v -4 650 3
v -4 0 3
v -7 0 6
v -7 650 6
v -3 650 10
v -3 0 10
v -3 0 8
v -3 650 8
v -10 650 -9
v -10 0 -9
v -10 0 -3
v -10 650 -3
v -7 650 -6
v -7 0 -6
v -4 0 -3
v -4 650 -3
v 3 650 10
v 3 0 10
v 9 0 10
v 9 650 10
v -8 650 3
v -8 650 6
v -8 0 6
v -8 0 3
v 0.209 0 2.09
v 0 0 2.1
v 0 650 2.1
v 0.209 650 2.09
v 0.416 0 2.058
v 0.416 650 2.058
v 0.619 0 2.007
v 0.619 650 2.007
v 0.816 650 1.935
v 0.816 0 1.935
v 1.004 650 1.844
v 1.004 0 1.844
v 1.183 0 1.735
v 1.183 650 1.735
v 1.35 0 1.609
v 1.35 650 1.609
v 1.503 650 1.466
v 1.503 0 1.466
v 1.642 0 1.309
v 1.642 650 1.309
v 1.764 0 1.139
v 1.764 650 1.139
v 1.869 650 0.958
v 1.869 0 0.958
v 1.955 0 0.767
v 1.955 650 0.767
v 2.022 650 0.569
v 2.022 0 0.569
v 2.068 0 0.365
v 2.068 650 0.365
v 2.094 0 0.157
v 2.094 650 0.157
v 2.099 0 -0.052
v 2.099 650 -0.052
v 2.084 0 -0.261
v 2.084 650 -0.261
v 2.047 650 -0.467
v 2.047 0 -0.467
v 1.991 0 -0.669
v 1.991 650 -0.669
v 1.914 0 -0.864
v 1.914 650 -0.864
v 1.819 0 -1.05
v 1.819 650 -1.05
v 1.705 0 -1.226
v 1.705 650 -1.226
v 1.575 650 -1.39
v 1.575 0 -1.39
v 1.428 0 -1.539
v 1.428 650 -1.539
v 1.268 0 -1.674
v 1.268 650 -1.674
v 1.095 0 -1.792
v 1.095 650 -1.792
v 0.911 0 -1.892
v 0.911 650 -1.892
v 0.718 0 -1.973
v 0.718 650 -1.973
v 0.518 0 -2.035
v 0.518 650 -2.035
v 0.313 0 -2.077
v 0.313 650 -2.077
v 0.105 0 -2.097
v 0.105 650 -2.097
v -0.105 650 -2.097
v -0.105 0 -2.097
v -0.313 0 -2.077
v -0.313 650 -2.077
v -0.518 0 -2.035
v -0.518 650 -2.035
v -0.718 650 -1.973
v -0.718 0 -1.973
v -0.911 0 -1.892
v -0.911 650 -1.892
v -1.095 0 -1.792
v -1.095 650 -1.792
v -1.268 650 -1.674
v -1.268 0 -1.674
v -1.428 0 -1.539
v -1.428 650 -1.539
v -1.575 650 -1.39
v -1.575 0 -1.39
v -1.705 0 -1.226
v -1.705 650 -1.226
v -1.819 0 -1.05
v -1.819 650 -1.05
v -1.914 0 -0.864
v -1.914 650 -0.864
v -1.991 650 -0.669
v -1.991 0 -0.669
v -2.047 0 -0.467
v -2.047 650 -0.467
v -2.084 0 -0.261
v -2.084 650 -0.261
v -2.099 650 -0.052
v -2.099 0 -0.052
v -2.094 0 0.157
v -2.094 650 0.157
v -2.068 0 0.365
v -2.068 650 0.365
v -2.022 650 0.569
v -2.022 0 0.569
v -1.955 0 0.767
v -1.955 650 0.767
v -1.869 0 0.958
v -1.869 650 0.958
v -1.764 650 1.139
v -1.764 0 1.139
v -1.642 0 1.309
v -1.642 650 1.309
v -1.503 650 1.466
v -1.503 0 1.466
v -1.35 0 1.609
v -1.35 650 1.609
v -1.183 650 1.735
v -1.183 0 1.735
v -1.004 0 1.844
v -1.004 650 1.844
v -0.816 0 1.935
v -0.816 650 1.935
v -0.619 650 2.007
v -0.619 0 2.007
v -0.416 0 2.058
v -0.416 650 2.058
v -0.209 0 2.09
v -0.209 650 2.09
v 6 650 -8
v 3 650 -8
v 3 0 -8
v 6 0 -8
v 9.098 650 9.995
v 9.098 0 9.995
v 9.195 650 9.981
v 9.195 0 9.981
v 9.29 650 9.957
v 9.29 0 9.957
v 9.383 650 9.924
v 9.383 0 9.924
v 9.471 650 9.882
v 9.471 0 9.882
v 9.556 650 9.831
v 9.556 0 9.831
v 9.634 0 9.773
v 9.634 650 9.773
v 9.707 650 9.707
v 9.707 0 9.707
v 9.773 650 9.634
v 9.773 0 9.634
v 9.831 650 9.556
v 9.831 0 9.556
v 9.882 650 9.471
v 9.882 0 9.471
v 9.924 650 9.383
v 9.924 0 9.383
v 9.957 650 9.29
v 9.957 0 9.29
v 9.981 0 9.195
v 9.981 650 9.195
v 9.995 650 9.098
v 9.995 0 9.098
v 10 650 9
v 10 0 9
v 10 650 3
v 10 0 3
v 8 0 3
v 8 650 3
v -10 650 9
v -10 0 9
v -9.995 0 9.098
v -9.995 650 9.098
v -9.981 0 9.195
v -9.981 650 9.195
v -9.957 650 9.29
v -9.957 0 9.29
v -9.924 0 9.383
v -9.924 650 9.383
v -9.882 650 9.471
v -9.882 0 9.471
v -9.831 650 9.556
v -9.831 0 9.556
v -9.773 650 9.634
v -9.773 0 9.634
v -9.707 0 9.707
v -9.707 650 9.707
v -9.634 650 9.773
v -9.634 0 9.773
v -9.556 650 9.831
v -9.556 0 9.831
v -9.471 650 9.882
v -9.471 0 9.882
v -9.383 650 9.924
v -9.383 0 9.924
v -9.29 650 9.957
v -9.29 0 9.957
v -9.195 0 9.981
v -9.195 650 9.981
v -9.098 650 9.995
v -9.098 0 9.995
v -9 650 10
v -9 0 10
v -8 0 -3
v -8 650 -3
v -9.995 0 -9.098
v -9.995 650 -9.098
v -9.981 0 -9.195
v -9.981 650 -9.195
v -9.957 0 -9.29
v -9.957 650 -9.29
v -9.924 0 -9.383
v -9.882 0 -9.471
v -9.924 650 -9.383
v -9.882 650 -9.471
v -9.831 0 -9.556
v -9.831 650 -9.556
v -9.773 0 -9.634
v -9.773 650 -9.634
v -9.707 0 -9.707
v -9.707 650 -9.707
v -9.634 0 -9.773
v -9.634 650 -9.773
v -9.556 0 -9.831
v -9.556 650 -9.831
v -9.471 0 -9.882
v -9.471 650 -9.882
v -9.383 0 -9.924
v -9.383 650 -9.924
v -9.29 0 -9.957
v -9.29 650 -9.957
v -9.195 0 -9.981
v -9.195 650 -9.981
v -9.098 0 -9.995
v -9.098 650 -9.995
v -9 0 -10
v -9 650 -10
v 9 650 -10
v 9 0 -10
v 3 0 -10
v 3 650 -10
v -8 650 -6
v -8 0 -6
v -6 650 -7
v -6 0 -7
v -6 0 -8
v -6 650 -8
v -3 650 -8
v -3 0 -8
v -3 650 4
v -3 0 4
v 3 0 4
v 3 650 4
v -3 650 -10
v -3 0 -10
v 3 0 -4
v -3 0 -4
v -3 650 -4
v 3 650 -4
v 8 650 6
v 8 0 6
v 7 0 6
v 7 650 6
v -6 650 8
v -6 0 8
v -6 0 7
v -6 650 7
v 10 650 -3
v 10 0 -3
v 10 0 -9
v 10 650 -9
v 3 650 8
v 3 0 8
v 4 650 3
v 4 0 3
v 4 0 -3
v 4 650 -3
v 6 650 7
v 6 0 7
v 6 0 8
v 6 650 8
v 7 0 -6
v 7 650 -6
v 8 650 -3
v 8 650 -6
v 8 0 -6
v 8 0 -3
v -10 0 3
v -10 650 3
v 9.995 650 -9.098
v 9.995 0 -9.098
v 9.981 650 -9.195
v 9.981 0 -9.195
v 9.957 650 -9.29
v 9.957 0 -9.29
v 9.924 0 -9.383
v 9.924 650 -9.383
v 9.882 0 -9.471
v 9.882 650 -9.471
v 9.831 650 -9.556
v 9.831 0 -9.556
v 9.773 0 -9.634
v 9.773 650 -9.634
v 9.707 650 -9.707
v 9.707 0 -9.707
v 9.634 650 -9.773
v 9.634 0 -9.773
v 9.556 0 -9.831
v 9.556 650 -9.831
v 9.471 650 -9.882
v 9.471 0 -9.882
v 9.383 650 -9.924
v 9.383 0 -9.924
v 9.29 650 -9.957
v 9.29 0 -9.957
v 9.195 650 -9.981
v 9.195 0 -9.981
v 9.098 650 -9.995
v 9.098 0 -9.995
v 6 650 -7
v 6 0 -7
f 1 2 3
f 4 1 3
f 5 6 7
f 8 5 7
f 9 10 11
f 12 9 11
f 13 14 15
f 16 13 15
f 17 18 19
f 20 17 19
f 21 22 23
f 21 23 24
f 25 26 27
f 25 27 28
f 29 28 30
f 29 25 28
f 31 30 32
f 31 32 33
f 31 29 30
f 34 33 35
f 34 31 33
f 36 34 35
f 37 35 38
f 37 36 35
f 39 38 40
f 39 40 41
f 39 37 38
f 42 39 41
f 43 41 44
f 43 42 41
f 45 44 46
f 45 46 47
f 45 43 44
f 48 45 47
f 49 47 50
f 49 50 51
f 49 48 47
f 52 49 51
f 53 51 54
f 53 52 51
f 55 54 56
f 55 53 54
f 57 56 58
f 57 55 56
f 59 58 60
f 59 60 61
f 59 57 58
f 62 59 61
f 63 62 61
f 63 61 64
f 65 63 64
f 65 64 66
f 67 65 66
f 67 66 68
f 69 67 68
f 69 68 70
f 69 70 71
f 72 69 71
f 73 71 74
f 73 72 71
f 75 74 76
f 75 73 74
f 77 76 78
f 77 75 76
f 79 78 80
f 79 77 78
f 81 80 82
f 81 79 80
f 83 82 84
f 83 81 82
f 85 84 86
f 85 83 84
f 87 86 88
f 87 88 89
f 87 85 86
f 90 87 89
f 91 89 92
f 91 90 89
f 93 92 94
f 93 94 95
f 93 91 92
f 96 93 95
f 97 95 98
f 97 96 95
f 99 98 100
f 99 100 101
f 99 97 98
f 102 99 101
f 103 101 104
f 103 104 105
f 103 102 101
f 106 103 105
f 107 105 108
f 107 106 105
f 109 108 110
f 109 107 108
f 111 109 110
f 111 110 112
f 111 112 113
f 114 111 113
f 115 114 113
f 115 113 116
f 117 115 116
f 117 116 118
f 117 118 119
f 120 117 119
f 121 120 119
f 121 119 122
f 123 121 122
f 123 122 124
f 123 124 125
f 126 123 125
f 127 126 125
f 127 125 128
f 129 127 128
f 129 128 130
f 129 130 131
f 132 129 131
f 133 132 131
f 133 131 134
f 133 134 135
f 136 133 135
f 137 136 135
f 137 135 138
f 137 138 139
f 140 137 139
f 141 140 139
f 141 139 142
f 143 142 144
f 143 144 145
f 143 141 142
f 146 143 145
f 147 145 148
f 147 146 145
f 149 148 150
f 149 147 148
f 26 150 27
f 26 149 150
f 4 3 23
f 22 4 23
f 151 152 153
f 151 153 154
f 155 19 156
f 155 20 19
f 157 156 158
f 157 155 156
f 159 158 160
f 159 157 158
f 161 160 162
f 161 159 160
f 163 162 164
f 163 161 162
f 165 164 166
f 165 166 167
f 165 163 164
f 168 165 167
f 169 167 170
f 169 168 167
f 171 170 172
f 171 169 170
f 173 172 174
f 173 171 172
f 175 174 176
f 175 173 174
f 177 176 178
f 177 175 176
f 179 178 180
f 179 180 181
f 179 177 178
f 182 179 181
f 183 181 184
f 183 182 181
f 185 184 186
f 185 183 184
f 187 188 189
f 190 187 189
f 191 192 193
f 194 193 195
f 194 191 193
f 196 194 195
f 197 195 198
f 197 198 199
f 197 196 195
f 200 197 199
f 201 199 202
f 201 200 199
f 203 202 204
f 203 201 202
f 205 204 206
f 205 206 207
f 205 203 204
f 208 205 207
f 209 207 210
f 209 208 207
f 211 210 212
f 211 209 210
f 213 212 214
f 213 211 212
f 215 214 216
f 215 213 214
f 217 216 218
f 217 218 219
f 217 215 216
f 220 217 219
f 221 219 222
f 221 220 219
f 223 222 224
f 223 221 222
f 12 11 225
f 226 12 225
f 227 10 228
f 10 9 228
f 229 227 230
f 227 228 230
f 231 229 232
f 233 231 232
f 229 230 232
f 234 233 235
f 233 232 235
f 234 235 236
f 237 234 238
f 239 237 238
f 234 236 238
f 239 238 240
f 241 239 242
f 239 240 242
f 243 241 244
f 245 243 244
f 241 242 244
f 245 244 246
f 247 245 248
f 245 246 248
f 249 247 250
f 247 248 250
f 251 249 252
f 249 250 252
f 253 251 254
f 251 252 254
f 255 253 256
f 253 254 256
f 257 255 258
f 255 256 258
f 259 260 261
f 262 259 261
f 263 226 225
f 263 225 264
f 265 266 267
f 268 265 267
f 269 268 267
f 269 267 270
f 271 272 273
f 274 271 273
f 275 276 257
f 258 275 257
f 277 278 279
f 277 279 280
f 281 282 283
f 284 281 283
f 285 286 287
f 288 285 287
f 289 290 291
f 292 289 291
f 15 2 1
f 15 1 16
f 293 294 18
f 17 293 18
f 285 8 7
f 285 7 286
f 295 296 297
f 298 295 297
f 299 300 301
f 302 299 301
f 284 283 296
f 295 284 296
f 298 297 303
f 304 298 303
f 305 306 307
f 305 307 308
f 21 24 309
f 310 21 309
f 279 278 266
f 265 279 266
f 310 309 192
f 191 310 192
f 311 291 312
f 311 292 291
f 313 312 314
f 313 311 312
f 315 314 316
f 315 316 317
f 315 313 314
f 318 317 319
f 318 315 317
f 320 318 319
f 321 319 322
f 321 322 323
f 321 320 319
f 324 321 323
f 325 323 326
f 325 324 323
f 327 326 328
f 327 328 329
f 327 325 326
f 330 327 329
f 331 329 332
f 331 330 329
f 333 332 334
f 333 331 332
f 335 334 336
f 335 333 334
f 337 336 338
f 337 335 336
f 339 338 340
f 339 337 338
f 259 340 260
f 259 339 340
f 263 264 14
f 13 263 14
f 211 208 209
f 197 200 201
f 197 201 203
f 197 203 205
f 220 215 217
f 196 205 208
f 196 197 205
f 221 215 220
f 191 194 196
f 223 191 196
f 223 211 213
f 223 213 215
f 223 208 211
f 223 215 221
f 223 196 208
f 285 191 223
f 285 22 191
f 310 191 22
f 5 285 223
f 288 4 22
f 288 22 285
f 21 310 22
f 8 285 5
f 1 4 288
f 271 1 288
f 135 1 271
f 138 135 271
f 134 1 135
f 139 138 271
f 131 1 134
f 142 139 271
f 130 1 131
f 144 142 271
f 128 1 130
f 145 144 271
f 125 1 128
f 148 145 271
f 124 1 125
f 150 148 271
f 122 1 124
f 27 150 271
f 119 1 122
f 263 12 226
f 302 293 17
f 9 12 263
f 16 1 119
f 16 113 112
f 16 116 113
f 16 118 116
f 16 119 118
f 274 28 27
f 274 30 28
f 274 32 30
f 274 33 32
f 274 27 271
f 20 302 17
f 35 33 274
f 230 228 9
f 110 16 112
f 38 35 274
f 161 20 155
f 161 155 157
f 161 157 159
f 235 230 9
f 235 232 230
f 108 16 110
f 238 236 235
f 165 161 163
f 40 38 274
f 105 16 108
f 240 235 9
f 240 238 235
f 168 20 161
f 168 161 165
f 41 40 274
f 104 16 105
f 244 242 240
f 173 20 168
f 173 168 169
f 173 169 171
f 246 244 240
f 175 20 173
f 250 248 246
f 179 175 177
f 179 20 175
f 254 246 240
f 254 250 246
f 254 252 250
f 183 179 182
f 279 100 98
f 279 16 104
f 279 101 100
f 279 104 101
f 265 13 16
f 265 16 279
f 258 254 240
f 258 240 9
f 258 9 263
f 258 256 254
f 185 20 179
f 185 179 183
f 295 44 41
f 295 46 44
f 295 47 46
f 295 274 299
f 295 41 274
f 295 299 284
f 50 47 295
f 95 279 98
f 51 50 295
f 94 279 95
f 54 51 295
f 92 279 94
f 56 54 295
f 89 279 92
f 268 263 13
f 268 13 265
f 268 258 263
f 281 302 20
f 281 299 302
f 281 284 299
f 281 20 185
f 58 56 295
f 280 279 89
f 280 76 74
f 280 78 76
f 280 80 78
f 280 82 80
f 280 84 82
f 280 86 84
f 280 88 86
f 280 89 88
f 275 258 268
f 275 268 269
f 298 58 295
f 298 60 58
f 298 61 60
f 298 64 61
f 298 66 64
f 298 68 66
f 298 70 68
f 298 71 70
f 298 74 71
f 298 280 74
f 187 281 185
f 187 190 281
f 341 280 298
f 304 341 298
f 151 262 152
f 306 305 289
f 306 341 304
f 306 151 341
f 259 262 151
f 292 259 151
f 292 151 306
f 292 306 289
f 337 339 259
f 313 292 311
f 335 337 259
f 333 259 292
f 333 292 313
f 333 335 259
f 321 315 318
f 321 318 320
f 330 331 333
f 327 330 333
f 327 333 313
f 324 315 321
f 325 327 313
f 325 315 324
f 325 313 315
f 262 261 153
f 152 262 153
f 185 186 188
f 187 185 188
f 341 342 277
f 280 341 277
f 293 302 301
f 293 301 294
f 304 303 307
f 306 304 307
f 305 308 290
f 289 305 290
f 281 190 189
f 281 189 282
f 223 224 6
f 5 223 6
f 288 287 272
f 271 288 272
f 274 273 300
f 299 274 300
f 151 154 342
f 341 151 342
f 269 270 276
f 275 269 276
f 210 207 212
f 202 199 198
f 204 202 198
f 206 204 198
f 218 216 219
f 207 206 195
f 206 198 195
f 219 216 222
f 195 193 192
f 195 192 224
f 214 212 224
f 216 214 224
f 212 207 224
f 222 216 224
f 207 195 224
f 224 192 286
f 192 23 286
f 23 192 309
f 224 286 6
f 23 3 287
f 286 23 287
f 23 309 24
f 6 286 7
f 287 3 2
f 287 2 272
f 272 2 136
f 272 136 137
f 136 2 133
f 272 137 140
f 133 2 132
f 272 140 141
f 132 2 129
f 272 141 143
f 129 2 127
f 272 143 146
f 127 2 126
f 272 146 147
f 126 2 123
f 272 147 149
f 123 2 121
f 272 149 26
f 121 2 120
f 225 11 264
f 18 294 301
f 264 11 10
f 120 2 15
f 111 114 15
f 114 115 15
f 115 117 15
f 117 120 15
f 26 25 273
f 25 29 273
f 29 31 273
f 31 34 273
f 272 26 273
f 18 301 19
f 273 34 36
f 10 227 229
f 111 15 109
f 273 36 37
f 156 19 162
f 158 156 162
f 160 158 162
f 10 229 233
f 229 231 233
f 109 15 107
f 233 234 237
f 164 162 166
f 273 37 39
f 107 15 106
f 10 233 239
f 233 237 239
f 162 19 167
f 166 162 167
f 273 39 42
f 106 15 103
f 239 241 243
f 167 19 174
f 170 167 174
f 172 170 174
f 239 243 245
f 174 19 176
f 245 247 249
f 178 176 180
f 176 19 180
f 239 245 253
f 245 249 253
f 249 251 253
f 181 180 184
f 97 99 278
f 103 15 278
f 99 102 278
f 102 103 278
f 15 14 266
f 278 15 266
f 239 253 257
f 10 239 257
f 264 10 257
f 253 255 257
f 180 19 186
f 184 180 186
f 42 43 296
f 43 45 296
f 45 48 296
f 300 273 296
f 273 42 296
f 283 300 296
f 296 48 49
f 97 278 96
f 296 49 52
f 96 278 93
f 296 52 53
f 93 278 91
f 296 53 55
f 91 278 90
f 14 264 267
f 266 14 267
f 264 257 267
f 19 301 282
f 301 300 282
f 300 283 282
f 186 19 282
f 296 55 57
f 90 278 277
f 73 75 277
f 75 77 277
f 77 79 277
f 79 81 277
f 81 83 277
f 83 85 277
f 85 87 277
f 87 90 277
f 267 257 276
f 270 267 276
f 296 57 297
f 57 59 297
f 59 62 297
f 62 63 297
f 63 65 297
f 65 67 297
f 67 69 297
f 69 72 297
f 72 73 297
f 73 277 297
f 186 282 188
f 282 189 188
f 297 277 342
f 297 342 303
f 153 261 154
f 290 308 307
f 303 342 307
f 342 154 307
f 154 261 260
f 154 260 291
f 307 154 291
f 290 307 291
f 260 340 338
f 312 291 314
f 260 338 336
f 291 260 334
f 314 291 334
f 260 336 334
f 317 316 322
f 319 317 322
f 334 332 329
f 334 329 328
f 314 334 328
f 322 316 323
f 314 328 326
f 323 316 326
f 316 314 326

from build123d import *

# Parameters (mm, degrees)
SKETCH1_W           = 8
SKETCH1_H           = 8
SKETCH1_R           = 2.1
BOSS_EXTRUDE1_DEPTH = 650
FILLET1_R           = 1


with BuildPart() as part:
    # Sketch1 → Boss-Extrude1 (new body)
    # profile 1 of 6: a face of its own
    with BuildSketch(Plane(origin=(0, 0, 0), x_dir=(1, 0, 0), z_dir=(0, 1, 0))):
        Polygon((-4, 4), (-10, 10), (-10, 3), (-8, 3), (-8, 6), (-7, 6), (-4, 3), align=None)
    # profile 2 of 6: a face of its own
    with BuildSketch(Plane(origin=(0, 0, 0), x_dir=(1, 0, 0), z_dir=(0, 1, 0))):
        Polygon((-3, 8), (-3, 10), (-10, 10), (-4, 4), (-3, 4), (-6, 7), (-6, 8), align=None)
    # profile 3 of 6: a face of its own
    with BuildSketch(Plane(origin=(0, 0, 0), x_dir=(1, 0, 0), z_dir=(0, 1, 0))):
        Polygon((6, 7), (3, 4), (4, 4), (4, 3), (7, 6), (8, 6), (8, 3), (10, 3), (10, 10), (3, 10), (3, 8), (6, 8), align=None)
    # profile 4 of 6: a face of its own
    with BuildSketch(Plane(origin=(0, 0, 0), x_dir=(1, 0, 0), z_dir=(0, 1, 0))):
        Rectangle(SKETCH1_W, SKETCH1_H)
        with Locations(Location((0, 0, 0), (0, 0, 270))):
            Circle(SKETCH1_R, mode=Mode.SUBTRACT)
    # profile 5 of 6: a face of its own
    with BuildSketch(Plane(origin=(0, 0, 0), x_dir=(1, 0, 0), z_dir=(0, 1, 0))):
        Polygon((4, -4), (3, -4), (6, -7), (6, -8), (3, -8), (3, -10), (10, -10), (10, -3), (8, -3), (8, -6), (7, -6), (4, -3), align=None)
    # profile 6 of 6: a face of its own
    with BuildSketch(Plane(origin=(0, 0, 0), x_dir=(1, 0, 0), z_dir=(0, 1, 0))):
        Polygon((-4, -4), (-4, -3), (-7, -6), (-8, -6), (-8, -3), (-10, -3), (-10, -10), (-3, -10), (-3, -8), (-6, -8), (-6, -7), (-3, -4), align=None)
    extrude(amount=BOSS_EXTRUDE1_DEPTH)

    # Fillet1
    fillet1_edges = [part.edges().sort_by_distance(p)[0] for p in [
        (-10, 325, 10),
        (-10, 325, -10),
        (10, 325, -10),
        (10, 325, 10),
    ]]
    fillet(fillet1_edges, radius=FILLET1_R)


solid = part.part
